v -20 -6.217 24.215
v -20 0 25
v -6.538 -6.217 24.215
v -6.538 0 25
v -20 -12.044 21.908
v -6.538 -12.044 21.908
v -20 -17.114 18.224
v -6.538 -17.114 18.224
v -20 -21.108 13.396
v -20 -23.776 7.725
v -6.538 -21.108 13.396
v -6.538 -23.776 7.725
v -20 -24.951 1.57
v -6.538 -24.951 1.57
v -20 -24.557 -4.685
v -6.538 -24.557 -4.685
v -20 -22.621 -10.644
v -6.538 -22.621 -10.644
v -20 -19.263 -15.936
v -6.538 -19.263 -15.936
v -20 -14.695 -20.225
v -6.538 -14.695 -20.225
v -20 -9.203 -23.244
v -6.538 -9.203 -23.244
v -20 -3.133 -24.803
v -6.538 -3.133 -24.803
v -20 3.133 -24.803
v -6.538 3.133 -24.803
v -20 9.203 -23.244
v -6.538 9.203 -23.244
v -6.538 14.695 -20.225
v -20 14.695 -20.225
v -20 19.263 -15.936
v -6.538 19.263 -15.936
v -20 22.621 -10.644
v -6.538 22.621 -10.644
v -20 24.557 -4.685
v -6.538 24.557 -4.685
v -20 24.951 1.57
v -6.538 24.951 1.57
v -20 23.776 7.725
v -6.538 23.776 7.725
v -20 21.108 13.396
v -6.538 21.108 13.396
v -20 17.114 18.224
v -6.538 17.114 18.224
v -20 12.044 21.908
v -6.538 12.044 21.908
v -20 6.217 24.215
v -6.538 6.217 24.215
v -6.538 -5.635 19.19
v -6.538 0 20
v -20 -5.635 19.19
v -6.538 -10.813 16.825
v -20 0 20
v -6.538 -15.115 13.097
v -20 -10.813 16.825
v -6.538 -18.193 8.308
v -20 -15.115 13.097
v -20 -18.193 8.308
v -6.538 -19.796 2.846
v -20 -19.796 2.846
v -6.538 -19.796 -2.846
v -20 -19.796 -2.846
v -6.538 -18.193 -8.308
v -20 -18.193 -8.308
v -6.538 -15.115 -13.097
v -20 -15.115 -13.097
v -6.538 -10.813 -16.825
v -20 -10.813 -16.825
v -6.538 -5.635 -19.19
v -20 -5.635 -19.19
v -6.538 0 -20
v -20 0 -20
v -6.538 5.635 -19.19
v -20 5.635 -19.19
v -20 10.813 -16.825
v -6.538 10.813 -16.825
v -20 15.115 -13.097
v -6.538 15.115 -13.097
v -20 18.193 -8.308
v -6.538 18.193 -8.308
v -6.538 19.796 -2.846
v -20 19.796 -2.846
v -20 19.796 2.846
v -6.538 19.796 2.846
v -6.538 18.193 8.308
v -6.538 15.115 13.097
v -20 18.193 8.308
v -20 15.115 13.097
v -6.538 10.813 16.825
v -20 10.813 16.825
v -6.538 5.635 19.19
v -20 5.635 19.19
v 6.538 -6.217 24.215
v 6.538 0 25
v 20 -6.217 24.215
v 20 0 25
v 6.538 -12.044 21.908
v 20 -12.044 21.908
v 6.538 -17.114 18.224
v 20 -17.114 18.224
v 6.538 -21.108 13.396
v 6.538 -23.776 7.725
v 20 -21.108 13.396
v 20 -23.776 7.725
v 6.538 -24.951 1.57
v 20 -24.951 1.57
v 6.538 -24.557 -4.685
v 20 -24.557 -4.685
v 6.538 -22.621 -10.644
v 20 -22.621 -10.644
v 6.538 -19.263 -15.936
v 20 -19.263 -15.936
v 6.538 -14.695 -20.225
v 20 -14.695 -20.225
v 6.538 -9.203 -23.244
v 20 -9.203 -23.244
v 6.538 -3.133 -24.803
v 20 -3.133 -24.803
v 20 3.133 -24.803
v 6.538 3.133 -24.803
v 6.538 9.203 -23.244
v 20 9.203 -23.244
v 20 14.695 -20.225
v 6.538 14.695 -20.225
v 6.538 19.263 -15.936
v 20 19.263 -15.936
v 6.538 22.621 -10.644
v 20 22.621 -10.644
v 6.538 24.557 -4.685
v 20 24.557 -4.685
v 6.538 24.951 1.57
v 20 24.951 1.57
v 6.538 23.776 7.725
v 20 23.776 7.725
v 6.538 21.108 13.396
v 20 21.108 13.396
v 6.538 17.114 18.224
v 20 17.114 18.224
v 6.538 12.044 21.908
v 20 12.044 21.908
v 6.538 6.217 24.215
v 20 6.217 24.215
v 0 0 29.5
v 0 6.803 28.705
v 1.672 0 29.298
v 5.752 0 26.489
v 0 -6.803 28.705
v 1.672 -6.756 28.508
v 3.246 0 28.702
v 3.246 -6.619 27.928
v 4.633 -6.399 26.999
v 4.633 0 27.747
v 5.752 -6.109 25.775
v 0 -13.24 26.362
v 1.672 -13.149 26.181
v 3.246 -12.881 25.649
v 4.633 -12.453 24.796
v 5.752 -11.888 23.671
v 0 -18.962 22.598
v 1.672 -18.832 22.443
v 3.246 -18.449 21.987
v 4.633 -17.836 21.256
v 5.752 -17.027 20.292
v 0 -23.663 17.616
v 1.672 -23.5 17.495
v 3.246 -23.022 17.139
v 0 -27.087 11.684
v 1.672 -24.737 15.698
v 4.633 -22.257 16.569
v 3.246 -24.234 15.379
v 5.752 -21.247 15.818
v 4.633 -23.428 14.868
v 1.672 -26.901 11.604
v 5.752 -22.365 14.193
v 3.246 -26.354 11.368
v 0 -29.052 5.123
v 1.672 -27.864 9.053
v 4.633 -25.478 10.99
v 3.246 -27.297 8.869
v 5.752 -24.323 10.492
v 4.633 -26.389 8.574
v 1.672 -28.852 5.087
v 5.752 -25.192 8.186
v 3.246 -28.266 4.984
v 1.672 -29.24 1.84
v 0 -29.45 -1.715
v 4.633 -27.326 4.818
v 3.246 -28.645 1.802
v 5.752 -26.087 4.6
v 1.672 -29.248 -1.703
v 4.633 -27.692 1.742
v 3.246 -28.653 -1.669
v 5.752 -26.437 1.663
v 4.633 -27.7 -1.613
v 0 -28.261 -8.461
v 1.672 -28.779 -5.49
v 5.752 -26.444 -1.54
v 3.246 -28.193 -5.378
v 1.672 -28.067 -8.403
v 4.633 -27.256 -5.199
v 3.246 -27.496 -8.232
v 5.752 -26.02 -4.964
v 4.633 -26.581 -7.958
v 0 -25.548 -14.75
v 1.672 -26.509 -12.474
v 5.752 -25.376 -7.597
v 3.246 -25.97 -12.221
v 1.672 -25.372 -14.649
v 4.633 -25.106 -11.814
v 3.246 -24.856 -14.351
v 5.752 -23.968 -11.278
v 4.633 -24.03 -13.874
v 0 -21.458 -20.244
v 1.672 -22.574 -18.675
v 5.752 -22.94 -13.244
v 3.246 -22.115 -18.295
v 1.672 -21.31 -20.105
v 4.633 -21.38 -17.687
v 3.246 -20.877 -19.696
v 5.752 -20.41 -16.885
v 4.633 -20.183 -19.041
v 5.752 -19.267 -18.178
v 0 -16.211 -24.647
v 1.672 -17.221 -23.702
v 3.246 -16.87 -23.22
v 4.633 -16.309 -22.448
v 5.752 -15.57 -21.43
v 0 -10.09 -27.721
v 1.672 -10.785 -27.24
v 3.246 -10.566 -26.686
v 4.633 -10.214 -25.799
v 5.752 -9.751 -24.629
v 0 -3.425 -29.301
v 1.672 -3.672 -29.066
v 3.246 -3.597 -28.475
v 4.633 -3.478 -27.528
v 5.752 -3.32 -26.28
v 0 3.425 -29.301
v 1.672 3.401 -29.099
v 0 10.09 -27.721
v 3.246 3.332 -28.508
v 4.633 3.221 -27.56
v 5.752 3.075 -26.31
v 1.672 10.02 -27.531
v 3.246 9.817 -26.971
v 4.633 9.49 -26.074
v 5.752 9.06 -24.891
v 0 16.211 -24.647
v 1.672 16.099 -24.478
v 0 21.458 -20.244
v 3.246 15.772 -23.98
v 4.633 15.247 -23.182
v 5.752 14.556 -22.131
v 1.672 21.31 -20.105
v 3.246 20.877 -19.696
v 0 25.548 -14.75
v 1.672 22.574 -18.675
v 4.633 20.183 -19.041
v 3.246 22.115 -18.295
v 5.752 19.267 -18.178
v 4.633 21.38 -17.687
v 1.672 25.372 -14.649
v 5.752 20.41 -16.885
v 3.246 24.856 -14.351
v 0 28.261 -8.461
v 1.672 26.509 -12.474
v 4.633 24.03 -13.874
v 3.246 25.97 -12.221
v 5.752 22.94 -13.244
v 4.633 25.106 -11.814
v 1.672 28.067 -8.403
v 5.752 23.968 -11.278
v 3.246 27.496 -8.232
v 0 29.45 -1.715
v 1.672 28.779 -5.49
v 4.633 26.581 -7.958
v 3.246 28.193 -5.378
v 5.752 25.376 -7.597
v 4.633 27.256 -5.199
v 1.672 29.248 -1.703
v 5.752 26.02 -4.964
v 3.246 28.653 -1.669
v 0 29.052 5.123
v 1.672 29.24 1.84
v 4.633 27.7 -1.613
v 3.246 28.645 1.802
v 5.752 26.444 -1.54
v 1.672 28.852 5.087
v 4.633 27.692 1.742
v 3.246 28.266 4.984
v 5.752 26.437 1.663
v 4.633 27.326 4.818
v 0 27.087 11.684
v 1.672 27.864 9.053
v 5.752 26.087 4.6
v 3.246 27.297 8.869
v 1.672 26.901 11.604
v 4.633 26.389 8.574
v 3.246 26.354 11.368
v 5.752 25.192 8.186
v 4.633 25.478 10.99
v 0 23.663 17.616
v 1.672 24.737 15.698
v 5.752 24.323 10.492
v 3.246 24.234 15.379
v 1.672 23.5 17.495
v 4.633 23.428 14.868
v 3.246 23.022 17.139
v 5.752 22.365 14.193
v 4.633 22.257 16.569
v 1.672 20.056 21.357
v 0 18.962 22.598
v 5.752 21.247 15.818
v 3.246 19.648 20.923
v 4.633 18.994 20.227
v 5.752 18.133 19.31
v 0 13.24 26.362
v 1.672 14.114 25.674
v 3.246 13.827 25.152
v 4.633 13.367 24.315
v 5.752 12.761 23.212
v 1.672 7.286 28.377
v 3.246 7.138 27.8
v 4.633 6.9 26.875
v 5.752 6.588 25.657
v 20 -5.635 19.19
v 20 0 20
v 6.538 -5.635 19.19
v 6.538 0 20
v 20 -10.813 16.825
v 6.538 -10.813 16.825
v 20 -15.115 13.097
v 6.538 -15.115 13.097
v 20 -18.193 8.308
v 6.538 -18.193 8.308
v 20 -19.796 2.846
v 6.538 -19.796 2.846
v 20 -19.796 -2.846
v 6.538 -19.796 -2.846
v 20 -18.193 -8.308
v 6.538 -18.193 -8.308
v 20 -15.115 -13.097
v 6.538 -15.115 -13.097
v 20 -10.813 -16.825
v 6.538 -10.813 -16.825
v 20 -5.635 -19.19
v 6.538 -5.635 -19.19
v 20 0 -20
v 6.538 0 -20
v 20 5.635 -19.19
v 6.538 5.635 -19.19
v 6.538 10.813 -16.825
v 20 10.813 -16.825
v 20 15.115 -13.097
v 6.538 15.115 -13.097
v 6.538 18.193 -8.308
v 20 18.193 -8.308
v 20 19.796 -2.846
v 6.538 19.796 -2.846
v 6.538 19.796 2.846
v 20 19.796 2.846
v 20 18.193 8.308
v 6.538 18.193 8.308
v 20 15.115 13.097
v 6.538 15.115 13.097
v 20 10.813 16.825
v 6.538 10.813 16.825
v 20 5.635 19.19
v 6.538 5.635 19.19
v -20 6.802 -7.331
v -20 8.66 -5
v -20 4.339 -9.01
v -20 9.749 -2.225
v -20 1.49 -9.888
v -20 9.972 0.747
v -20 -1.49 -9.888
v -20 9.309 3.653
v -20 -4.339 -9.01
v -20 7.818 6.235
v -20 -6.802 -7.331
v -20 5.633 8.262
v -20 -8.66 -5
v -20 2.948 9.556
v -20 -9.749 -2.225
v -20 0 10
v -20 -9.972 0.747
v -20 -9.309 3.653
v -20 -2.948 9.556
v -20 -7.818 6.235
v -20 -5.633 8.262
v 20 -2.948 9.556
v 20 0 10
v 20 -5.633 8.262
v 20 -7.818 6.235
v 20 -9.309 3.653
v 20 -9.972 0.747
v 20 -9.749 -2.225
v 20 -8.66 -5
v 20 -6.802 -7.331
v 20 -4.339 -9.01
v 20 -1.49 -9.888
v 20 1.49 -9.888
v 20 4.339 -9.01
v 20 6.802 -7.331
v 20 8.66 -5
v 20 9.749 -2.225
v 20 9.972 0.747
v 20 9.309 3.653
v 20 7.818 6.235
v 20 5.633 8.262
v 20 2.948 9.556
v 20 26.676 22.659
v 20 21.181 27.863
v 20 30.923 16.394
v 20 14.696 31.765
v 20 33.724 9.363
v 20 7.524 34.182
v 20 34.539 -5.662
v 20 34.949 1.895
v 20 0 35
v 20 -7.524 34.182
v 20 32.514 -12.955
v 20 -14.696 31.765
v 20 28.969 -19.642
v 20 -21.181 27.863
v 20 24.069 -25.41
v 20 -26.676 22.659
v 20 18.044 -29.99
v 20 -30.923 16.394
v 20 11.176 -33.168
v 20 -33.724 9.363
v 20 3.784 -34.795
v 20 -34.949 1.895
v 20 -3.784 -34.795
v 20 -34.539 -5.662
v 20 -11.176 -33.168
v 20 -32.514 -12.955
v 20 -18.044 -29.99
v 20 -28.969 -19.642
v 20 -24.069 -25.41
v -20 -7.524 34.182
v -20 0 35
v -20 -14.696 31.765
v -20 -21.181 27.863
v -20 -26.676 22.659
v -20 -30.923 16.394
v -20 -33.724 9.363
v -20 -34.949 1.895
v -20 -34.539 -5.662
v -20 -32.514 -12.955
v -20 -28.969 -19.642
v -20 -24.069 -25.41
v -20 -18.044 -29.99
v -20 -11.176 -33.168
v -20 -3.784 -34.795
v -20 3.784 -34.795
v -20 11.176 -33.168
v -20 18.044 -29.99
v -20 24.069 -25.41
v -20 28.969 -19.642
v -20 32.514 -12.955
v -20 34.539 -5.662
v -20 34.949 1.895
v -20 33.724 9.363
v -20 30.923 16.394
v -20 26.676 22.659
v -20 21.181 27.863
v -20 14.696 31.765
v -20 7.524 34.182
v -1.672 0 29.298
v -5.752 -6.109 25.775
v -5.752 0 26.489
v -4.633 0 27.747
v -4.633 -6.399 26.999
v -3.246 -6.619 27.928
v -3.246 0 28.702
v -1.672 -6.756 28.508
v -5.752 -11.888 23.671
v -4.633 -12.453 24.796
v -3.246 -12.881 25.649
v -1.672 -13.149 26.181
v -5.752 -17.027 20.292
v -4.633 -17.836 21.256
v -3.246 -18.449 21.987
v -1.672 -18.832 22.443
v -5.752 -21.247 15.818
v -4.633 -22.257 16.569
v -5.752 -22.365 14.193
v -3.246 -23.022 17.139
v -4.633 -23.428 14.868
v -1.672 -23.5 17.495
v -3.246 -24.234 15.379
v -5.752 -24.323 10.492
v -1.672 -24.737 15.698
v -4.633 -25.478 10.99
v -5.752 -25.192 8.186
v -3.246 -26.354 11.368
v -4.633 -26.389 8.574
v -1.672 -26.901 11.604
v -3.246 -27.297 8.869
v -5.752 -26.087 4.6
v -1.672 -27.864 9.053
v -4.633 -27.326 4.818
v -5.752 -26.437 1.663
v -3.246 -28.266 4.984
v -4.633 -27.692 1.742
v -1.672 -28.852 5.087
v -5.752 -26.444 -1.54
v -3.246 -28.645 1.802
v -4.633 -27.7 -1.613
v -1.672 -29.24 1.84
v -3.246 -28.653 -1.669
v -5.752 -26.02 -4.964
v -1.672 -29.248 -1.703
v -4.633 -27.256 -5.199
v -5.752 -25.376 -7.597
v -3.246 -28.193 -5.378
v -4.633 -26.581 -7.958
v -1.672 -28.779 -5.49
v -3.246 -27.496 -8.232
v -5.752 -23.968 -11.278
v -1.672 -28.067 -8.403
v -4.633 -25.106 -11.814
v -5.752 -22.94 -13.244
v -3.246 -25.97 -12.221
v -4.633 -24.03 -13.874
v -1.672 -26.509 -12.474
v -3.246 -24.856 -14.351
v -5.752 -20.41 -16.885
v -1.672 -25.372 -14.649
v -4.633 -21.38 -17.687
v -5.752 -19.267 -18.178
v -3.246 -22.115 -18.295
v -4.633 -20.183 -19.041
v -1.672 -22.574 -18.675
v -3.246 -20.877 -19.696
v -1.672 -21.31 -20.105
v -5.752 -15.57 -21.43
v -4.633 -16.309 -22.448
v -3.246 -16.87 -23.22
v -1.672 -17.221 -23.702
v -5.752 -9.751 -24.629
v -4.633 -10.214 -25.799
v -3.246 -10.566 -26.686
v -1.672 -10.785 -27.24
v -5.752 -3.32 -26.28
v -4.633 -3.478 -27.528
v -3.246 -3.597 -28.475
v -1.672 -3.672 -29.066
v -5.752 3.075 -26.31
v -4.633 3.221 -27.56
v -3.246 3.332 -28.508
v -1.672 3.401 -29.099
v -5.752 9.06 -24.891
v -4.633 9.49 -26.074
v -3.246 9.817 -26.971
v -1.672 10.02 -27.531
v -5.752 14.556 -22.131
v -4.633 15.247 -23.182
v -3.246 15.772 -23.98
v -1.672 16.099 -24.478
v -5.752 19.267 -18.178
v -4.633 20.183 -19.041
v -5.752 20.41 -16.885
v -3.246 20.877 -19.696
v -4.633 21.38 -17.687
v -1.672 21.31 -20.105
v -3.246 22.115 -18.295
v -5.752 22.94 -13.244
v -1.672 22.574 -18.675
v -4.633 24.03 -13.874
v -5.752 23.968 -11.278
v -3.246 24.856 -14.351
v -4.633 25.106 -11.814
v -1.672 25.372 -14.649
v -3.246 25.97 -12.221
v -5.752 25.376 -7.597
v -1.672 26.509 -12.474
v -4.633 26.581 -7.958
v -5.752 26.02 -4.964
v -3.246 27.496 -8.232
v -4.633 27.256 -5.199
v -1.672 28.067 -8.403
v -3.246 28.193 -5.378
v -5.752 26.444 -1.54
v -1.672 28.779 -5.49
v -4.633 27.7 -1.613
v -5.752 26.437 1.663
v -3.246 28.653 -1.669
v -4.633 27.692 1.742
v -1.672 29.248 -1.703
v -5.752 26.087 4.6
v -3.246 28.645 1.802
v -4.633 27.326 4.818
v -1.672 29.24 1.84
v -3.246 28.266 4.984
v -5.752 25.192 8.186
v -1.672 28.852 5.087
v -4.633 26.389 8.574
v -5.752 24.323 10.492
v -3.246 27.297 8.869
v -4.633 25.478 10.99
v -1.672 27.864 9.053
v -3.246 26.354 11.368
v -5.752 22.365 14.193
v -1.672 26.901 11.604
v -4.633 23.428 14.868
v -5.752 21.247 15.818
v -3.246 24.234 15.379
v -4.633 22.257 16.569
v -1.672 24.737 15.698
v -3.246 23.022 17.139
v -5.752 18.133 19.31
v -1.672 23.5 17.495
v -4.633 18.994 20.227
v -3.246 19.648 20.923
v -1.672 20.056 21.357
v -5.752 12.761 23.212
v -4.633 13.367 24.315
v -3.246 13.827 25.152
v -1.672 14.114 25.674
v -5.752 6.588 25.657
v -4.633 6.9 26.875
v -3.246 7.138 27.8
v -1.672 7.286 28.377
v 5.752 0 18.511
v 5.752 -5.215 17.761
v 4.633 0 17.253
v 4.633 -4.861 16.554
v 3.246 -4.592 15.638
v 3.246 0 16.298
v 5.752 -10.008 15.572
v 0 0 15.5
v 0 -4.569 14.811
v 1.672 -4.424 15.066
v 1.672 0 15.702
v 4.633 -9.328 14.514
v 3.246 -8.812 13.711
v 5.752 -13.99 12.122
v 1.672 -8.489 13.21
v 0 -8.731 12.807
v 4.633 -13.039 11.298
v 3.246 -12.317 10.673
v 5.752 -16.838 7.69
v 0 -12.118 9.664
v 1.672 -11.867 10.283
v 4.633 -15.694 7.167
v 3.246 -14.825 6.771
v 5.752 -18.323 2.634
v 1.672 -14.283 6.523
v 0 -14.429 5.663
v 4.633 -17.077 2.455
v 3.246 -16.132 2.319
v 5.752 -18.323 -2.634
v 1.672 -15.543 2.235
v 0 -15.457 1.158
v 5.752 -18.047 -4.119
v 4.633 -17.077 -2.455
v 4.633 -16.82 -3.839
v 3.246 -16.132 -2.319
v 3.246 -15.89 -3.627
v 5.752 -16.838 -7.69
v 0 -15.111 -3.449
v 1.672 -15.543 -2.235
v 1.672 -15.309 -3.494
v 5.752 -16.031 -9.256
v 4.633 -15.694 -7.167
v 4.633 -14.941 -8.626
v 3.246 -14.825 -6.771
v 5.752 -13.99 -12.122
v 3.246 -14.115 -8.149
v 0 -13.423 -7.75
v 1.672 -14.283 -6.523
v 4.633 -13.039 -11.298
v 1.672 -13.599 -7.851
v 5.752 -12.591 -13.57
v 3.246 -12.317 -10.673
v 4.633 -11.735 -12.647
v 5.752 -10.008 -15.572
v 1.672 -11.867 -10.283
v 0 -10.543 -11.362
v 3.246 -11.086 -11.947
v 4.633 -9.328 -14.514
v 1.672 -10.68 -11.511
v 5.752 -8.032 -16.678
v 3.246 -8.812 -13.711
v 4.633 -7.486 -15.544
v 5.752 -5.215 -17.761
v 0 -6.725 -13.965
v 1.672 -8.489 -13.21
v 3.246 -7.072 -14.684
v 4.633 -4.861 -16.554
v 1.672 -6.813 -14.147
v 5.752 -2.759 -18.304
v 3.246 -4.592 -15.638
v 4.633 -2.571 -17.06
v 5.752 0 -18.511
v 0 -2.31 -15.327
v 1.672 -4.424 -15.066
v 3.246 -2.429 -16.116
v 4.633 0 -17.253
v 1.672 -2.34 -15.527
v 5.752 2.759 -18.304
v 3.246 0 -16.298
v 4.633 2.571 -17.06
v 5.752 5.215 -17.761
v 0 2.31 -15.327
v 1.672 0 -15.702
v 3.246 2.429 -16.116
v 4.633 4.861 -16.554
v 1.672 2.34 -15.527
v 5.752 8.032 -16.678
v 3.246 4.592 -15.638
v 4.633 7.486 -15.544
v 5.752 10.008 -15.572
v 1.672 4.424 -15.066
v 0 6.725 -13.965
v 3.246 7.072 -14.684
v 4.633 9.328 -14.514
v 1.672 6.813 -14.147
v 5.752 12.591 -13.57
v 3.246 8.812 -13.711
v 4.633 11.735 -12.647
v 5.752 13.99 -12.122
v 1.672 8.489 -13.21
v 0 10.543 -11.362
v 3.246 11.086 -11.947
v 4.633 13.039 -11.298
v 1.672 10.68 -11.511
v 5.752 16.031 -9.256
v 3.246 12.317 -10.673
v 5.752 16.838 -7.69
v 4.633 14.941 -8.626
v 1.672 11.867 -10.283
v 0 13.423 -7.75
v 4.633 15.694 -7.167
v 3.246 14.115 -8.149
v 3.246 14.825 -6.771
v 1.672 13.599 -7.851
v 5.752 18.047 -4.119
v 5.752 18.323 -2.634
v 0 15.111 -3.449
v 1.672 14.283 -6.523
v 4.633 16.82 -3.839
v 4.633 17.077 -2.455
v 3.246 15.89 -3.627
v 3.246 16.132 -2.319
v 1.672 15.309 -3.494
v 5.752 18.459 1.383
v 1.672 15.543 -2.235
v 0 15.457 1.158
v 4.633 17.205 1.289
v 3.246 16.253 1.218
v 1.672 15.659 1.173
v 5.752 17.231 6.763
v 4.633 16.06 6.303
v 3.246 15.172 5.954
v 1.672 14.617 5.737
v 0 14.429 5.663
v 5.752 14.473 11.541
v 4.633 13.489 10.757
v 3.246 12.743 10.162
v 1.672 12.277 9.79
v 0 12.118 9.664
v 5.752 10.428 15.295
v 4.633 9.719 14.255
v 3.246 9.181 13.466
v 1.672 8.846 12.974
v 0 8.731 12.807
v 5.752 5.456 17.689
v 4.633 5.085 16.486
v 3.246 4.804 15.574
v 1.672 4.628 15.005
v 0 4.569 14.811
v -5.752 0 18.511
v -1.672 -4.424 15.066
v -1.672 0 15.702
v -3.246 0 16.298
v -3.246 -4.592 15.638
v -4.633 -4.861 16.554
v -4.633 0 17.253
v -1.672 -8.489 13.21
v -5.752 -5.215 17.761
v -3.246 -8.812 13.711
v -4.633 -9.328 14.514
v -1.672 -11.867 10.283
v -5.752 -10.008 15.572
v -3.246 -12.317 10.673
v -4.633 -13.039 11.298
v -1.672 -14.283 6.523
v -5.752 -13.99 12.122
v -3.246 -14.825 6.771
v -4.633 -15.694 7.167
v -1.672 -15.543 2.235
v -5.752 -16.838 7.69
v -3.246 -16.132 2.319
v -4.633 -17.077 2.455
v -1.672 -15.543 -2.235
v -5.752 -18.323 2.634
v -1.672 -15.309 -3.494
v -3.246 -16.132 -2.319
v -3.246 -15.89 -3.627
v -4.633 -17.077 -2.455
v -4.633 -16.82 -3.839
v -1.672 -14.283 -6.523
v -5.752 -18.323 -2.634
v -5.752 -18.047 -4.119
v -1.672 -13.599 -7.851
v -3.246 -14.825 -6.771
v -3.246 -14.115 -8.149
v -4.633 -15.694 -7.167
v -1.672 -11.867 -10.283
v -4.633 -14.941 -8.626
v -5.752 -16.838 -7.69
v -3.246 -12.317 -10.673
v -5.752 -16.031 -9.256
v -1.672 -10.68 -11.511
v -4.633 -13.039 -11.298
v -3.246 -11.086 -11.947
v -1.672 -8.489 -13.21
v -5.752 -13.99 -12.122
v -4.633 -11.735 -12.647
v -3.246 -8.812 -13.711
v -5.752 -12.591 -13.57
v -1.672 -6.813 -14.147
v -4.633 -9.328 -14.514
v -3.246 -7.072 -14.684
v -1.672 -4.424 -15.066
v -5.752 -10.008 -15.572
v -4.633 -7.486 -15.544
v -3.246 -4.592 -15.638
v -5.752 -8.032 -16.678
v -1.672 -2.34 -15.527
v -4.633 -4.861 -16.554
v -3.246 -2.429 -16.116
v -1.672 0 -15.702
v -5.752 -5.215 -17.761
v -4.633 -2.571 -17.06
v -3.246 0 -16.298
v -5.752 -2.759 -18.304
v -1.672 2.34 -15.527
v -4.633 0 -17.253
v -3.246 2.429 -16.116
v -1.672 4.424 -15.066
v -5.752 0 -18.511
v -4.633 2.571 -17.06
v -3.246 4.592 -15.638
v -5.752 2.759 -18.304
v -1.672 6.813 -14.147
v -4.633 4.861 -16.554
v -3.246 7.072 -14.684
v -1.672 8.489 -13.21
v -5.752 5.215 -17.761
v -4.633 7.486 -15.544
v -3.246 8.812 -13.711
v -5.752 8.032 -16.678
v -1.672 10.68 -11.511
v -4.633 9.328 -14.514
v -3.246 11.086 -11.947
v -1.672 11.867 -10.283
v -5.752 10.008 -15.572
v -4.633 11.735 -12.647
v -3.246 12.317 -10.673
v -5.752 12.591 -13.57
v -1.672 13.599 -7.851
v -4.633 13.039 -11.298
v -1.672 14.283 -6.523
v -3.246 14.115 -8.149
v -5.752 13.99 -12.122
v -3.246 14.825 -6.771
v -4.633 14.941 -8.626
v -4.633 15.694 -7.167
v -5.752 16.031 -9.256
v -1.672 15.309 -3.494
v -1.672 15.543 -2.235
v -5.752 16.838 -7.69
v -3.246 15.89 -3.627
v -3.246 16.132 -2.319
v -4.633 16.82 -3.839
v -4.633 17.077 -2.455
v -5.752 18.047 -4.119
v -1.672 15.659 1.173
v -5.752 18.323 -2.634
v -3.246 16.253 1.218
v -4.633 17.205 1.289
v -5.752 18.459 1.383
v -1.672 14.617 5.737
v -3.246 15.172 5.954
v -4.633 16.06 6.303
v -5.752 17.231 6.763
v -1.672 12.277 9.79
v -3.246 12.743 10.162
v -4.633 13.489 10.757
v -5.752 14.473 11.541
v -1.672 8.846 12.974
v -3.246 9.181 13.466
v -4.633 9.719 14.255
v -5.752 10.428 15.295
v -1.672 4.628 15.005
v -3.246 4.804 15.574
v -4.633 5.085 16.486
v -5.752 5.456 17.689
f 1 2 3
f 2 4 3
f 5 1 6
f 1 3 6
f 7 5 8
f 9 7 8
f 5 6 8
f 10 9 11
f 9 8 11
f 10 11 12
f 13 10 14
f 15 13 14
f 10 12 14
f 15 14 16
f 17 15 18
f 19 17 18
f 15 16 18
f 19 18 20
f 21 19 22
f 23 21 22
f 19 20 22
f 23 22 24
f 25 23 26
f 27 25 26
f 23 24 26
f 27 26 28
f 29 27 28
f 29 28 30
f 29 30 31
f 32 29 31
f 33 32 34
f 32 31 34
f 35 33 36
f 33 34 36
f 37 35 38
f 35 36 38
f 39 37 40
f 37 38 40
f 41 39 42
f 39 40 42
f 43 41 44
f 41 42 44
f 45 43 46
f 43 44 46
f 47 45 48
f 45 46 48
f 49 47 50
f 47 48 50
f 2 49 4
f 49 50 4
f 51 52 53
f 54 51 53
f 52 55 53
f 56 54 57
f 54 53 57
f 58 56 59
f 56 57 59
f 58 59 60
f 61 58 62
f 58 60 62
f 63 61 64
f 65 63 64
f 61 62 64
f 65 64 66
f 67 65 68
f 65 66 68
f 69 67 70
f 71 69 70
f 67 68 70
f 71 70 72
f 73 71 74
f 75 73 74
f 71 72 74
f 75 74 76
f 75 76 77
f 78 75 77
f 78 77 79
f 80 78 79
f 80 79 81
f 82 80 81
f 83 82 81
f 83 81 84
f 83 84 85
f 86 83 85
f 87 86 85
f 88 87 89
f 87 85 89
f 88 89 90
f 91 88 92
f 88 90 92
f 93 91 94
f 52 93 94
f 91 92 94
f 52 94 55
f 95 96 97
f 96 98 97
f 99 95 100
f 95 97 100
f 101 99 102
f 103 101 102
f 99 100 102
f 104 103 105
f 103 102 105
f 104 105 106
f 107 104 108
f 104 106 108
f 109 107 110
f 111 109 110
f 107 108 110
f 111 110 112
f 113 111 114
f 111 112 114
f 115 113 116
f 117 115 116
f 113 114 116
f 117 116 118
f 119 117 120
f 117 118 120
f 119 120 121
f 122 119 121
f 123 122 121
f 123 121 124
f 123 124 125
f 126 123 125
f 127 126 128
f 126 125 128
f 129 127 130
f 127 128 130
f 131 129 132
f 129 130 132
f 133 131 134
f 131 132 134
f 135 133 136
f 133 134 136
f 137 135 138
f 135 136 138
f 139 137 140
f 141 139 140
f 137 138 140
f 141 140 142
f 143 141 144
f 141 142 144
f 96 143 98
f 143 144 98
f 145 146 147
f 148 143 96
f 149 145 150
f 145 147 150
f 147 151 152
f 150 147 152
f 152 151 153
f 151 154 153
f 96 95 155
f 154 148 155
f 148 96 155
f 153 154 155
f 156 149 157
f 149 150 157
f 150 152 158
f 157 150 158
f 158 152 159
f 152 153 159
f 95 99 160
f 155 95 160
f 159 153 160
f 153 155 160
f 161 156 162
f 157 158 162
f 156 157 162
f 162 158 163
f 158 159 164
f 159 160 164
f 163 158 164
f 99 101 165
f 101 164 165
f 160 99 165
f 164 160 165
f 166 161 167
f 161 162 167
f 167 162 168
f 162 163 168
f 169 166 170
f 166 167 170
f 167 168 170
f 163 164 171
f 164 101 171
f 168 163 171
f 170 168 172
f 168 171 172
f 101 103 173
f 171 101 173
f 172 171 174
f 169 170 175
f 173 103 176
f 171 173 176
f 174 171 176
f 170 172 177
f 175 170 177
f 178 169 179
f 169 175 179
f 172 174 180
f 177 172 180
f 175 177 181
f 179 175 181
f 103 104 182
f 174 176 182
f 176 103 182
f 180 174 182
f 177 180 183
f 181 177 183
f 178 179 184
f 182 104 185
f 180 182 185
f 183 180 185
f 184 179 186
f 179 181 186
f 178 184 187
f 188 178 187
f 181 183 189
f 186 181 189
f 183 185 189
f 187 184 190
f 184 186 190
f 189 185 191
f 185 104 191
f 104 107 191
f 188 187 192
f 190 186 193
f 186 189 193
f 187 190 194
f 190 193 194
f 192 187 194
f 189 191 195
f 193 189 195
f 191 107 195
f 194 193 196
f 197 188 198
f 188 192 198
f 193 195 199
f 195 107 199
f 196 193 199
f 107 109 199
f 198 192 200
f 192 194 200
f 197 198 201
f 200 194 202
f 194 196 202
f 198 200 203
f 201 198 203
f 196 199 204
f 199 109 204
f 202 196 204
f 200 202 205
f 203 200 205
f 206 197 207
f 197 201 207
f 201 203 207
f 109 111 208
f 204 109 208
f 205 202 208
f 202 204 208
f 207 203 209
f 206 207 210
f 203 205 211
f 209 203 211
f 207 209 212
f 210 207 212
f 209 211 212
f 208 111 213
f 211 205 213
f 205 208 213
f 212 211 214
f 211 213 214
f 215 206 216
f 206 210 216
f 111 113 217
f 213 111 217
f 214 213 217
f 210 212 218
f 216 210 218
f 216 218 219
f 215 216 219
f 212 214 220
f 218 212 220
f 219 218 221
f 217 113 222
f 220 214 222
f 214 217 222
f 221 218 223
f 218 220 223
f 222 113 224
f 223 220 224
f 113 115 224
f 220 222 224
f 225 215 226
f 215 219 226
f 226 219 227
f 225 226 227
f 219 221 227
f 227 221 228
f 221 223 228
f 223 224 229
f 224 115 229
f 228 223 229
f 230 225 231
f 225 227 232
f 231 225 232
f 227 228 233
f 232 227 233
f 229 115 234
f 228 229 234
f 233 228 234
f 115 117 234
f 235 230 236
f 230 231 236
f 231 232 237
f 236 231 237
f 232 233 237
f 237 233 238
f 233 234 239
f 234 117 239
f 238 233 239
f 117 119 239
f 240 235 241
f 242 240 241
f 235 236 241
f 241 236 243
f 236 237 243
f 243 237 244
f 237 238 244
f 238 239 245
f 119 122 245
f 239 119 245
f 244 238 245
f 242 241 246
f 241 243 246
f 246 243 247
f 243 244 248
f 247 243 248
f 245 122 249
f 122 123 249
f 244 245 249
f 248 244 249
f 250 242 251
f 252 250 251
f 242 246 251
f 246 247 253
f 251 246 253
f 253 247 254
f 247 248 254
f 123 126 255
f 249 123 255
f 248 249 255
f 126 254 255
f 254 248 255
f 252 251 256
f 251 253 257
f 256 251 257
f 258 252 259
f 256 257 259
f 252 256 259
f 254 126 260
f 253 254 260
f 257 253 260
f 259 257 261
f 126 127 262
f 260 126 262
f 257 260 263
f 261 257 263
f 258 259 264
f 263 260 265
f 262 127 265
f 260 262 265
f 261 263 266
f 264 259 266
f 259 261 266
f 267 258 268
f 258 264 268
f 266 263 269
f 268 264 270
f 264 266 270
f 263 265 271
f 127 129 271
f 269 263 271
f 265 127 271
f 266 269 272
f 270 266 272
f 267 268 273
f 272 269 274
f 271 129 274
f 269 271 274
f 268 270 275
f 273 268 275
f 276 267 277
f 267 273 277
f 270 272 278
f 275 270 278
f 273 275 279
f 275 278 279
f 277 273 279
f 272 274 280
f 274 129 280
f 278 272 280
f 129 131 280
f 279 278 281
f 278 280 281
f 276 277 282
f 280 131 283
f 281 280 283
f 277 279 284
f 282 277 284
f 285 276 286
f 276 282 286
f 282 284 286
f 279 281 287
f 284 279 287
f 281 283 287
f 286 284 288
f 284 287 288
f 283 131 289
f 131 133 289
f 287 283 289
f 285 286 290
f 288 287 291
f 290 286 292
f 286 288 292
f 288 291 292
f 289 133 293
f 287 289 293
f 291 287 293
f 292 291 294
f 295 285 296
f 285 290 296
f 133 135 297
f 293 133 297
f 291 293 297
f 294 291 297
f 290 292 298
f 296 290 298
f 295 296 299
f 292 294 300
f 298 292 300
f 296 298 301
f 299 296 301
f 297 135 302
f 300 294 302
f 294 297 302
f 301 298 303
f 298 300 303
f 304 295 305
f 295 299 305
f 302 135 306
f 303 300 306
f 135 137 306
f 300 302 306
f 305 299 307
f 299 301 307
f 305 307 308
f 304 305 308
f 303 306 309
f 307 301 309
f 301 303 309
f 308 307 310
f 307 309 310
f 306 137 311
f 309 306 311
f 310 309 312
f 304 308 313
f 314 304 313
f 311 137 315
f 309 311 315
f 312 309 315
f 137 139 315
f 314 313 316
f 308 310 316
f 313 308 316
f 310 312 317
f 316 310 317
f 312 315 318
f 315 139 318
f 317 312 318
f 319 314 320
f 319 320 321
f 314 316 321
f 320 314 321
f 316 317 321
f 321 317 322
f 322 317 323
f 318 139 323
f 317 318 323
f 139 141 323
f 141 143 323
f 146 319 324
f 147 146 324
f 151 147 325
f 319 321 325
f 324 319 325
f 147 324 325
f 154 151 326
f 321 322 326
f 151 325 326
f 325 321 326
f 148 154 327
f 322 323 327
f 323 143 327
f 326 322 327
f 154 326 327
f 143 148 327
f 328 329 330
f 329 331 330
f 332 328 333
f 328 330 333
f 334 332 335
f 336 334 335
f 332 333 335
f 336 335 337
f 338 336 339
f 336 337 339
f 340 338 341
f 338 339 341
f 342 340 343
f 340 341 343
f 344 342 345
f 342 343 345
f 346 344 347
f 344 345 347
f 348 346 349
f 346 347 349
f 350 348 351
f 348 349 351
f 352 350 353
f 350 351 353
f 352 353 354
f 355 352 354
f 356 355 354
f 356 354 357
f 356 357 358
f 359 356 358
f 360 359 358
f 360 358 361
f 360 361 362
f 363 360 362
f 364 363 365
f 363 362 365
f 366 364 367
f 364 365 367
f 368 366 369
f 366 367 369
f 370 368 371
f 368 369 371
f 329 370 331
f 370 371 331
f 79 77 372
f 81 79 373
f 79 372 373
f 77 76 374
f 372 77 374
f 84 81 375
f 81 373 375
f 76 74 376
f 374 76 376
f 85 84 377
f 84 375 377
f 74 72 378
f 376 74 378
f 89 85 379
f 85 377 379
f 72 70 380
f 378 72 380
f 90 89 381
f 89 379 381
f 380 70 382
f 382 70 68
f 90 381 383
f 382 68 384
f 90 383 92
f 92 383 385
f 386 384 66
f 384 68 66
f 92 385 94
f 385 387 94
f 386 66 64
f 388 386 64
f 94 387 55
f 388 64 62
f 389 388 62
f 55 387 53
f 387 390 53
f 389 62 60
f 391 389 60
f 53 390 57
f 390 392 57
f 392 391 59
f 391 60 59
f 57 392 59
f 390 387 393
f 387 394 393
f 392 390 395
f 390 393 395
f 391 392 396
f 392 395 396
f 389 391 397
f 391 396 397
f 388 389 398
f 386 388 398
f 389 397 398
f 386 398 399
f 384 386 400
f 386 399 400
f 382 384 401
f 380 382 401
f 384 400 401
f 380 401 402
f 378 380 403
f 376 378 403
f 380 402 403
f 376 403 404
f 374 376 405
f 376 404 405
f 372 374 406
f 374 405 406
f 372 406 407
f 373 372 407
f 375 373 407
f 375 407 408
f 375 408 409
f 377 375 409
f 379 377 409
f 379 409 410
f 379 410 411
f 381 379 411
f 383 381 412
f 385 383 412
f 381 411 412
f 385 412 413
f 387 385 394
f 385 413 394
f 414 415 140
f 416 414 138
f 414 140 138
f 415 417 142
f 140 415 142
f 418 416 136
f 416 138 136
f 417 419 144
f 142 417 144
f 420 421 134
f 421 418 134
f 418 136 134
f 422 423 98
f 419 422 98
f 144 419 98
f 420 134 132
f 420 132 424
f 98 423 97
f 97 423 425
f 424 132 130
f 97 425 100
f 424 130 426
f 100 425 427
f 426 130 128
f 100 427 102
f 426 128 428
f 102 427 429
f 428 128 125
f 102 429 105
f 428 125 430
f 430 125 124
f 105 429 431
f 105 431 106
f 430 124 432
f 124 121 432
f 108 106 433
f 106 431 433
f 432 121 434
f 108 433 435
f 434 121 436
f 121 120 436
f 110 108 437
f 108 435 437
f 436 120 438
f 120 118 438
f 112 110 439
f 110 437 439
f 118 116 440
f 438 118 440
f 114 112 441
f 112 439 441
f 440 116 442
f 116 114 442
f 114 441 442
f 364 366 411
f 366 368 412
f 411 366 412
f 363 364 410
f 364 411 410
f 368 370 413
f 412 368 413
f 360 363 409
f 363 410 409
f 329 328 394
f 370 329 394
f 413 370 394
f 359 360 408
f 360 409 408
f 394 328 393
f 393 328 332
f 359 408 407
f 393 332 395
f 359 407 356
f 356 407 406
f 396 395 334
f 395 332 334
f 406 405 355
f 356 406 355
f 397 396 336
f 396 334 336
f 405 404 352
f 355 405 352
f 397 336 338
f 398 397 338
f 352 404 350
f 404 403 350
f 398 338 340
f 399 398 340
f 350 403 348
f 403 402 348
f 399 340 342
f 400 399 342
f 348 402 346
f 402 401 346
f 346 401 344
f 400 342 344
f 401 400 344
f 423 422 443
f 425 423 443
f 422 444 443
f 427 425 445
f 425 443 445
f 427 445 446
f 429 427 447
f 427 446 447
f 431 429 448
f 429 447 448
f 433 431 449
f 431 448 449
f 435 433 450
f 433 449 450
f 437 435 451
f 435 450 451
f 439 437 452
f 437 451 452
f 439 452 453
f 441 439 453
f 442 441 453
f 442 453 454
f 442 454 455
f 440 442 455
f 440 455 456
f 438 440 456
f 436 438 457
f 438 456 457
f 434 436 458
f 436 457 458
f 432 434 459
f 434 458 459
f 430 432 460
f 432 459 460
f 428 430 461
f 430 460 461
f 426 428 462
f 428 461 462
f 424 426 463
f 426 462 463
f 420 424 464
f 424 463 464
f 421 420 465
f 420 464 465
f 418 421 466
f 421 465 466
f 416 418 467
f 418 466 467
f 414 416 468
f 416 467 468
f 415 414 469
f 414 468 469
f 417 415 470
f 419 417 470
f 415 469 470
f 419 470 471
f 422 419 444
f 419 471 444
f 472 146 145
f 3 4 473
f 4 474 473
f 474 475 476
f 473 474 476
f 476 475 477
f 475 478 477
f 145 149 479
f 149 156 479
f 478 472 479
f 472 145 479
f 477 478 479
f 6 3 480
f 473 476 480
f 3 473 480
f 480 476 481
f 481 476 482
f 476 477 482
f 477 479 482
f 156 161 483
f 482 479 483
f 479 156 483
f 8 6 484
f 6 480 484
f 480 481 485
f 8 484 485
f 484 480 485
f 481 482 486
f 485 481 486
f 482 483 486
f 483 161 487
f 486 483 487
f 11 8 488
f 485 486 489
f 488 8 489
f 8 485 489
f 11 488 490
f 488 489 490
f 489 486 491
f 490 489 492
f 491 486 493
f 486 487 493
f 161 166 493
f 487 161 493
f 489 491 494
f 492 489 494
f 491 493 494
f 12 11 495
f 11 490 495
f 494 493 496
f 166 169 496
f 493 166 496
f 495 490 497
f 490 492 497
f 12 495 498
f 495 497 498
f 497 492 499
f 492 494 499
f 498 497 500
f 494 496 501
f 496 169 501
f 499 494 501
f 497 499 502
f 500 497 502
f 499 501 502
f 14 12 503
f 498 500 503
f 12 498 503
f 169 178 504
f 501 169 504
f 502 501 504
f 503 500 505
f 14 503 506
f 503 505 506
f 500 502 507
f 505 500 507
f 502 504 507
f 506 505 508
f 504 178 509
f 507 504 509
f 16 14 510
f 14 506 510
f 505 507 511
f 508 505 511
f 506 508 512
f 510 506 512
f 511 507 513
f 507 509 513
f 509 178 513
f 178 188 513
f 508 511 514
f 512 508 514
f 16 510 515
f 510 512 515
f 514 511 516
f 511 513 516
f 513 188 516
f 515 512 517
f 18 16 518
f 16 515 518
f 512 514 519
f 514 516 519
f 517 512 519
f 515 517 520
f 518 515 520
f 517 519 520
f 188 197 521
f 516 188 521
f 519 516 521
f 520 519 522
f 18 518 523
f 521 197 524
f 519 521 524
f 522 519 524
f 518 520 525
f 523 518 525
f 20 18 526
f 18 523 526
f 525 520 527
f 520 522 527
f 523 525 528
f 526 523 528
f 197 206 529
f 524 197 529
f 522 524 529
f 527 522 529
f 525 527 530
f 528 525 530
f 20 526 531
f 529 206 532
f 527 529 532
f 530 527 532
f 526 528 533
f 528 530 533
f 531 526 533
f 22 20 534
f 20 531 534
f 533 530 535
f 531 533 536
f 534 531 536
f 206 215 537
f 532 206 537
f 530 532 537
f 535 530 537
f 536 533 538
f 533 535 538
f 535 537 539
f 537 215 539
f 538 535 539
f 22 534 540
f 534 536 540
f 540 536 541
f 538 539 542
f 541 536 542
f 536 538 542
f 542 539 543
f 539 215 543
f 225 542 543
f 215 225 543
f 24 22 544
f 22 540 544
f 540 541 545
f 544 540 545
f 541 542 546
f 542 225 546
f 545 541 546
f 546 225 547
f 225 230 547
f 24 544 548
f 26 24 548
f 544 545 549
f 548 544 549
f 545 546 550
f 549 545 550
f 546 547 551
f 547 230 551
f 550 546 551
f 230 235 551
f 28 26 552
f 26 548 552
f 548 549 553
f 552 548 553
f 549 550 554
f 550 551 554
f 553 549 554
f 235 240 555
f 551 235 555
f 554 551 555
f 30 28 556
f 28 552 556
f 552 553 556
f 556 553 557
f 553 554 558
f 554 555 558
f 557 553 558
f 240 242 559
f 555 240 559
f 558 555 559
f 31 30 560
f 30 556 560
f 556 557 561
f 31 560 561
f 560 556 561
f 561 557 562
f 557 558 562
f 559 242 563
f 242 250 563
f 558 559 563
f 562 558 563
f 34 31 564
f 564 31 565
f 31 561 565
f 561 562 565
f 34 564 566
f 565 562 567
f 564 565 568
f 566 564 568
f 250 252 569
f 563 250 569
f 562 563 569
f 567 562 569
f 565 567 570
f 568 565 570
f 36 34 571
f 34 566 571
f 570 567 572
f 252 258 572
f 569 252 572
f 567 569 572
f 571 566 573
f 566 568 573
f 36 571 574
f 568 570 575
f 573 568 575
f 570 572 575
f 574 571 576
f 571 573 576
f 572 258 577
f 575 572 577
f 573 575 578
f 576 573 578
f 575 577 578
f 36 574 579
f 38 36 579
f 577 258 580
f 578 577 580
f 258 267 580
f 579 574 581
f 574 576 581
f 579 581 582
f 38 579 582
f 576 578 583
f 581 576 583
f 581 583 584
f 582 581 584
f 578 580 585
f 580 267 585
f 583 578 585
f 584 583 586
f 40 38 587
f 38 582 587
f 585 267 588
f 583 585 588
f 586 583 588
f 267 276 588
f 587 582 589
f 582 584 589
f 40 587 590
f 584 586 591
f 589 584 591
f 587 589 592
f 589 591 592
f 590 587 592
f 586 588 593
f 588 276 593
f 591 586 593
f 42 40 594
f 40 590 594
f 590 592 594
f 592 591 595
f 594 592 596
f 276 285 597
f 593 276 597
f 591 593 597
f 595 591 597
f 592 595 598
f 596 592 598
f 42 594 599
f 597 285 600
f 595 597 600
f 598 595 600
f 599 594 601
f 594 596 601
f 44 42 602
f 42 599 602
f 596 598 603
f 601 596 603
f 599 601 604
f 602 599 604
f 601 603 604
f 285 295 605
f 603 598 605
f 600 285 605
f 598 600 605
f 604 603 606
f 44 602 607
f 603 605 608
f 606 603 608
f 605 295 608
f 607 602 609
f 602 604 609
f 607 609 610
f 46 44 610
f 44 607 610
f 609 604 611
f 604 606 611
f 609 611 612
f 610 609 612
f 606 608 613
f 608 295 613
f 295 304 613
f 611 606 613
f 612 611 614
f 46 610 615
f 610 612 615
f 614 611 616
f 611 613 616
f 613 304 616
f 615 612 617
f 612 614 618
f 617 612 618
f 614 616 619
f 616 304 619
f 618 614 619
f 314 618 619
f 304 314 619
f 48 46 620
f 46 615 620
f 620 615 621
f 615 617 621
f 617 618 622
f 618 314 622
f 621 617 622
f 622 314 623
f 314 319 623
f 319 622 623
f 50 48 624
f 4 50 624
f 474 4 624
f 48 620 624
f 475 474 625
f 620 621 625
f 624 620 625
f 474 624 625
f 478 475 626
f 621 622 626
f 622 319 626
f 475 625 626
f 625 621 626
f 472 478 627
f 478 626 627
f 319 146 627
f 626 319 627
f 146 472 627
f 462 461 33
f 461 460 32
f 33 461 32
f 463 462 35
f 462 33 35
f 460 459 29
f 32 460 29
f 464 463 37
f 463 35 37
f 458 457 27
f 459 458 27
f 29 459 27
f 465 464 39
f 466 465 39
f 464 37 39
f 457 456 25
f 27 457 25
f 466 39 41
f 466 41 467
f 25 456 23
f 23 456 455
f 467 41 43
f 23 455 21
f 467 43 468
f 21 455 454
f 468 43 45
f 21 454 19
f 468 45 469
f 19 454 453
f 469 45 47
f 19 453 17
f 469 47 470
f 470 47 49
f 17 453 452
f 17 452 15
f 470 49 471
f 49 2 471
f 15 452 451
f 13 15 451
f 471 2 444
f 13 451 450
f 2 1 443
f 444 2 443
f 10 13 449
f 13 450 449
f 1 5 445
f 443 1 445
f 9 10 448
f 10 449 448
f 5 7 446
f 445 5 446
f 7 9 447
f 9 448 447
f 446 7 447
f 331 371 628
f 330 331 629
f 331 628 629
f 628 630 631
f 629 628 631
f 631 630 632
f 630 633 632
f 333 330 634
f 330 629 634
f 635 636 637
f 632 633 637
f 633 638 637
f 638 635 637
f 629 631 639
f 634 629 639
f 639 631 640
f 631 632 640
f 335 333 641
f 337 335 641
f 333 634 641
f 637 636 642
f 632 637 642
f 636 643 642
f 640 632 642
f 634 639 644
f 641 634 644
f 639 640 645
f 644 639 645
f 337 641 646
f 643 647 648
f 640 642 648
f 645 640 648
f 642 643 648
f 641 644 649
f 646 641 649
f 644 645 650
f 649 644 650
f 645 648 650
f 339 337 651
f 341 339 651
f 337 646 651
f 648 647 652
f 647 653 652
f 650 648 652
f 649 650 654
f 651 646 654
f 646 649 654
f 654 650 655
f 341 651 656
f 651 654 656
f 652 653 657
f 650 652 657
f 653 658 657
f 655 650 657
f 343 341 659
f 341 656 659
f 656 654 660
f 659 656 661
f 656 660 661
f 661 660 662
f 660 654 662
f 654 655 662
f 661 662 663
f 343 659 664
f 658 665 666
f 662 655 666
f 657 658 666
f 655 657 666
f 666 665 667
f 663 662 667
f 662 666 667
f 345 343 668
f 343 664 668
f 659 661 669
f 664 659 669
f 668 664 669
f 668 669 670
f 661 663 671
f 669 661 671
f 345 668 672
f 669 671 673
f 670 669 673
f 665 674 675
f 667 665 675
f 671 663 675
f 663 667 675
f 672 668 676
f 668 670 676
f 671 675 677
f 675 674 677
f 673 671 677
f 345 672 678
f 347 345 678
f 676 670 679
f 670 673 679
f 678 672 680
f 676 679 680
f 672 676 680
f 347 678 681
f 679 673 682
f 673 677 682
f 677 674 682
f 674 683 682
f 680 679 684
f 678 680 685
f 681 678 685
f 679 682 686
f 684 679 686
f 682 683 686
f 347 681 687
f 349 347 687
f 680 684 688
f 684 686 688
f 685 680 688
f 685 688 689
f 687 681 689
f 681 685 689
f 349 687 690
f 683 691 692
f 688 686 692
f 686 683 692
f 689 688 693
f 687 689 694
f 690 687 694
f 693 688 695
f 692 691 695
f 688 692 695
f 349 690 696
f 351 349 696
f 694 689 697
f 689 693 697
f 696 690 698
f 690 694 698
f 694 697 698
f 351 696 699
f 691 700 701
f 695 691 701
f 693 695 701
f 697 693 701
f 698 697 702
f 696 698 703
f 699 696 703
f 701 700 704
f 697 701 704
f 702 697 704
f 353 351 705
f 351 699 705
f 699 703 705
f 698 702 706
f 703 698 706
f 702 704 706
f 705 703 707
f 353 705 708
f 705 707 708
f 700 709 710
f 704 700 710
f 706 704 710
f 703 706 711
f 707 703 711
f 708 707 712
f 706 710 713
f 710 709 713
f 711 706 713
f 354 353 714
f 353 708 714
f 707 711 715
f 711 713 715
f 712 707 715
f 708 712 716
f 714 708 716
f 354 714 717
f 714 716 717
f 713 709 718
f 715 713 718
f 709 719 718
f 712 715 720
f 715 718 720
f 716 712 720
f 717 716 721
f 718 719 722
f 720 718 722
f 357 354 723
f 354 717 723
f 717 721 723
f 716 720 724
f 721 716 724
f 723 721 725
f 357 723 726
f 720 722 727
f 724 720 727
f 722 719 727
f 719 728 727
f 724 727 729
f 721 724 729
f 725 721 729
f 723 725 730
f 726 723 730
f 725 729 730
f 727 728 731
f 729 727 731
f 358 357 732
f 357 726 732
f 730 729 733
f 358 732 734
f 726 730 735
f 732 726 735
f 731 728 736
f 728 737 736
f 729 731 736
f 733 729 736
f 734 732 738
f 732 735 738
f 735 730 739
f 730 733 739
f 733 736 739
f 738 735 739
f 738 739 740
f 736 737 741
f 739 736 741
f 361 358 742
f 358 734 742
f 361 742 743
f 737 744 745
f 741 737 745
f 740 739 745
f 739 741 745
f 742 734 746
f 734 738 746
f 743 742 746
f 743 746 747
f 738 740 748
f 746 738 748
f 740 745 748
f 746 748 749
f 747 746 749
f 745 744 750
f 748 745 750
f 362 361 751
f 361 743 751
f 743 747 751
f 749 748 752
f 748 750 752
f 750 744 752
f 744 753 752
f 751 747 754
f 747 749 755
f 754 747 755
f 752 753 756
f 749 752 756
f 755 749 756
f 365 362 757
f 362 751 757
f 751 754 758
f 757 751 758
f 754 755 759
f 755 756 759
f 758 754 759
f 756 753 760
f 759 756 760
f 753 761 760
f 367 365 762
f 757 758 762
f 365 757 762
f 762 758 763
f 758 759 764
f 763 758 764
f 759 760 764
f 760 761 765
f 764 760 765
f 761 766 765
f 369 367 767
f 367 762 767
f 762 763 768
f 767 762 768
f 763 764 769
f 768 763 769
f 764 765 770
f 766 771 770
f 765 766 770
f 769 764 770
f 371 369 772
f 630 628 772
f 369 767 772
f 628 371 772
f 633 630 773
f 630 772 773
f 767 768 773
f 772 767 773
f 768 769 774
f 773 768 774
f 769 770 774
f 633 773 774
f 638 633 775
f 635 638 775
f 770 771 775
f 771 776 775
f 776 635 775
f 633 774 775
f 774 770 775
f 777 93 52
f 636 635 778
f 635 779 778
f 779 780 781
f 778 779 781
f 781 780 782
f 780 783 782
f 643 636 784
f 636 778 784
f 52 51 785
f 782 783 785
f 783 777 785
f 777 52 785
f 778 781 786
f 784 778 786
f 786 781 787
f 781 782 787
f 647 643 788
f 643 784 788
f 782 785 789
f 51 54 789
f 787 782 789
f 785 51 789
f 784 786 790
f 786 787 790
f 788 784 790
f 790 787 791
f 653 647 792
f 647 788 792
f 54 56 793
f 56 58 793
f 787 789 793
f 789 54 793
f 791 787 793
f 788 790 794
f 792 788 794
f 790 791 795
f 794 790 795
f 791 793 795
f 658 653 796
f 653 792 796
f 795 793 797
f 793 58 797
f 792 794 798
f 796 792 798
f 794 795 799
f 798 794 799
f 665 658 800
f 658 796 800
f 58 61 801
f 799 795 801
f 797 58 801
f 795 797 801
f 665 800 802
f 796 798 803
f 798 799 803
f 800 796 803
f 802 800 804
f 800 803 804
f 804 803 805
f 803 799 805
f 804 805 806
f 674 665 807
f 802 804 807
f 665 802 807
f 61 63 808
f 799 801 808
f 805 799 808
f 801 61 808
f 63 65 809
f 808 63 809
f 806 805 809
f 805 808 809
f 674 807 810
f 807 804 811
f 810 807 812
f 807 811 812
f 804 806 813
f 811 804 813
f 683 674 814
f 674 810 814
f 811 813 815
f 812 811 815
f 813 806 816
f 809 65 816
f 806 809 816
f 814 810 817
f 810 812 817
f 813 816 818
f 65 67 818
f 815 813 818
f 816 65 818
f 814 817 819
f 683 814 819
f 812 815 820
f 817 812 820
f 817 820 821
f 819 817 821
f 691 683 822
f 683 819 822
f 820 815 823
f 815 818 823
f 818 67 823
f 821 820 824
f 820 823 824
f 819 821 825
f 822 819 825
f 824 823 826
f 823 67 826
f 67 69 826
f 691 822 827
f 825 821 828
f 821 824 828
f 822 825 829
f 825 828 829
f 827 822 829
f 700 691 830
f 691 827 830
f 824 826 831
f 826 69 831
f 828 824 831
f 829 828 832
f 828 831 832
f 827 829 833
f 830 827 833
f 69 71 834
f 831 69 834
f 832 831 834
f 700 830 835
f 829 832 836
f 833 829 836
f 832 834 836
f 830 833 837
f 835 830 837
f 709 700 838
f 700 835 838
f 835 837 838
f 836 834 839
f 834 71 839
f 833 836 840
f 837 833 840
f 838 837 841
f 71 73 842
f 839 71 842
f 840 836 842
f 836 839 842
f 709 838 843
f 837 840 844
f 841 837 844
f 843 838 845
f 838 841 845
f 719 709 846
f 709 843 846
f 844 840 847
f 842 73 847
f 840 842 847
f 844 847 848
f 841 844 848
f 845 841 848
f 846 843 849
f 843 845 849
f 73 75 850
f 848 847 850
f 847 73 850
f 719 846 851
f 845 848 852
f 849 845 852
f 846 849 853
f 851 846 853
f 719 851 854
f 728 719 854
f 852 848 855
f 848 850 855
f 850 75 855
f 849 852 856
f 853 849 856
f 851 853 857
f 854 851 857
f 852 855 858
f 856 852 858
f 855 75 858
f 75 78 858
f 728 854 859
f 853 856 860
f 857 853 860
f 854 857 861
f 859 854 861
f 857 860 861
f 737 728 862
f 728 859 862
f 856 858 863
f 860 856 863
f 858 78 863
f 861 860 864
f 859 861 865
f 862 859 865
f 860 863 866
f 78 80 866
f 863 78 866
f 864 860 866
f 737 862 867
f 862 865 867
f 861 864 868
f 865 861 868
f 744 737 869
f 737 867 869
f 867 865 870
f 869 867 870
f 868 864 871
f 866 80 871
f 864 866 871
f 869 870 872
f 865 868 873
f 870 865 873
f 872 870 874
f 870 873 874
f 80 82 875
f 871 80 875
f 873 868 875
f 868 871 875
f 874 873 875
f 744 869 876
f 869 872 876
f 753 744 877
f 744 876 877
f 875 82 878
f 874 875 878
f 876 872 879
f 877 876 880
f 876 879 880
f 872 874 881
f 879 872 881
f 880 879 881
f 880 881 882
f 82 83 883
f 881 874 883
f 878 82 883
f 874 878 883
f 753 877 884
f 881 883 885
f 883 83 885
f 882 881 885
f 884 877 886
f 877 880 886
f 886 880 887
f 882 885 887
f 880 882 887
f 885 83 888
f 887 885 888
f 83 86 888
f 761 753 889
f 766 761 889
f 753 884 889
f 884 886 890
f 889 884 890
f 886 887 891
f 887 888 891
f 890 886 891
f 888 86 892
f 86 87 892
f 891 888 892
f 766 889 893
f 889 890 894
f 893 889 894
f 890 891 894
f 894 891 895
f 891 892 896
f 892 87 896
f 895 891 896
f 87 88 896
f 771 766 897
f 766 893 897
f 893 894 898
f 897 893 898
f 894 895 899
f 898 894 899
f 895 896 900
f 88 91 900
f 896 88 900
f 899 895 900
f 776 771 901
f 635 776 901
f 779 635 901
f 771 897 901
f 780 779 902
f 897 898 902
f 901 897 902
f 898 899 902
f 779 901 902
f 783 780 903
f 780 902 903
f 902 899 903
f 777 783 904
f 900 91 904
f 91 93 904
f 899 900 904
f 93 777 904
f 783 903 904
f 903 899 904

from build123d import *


with BuildPart() as f1:
    # F0 (on Front) → F1 (revolve)
    with BuildSketch(Plane.XZ):
        with BuildLine():
            Line((20, 35), (0, 35))
            Line((0, 35), (0, 29.5))
            ThreePointArc((0, 29.5), (3.968627, 28.266281), (6.538348, 25))
            Line((6.538348, 25), (20, 25))
            Line((20, 25), (20, 35))
        make_face()
        with BuildLine():
            Line((0, 29.5), (0, 35))
            Line((0, 35), (-20, 35))
            Line((-20, 35), (-20, 25))
            Line((-20, 25), (-6.538348, 25))
            ThreePointArc((-6.538348, 25), (-3.968627, 28.266281), (0, 29.5))
        make_face()
        with BuildLine():
            Line((20, 20), (6.538348, 20))
            ThreePointArc((6.538348, 20), (3.968627, 16.733719), (0, 15.5))
            Line((0, 15.5), (0, 10))
            Line((0, 10), (20, 10))
            Line((20, 10), (20, 20))
        make_face()
        with BuildLine():
            Line((0, 10), (0, 15.5))
            ThreePointArc((0, 15.5), (-3.968627, 16.733719), (-6.538348, 20))
            Line((-6.538348, 20), (-20, 20))
            Line((-20, 20), (-20, 10))
            Line((-20, 10), (0, 10))
        make_face()
    revolve(axis=Axis((22.886599, 0, 0), (1, 0, 0)))


solid = f1.part
